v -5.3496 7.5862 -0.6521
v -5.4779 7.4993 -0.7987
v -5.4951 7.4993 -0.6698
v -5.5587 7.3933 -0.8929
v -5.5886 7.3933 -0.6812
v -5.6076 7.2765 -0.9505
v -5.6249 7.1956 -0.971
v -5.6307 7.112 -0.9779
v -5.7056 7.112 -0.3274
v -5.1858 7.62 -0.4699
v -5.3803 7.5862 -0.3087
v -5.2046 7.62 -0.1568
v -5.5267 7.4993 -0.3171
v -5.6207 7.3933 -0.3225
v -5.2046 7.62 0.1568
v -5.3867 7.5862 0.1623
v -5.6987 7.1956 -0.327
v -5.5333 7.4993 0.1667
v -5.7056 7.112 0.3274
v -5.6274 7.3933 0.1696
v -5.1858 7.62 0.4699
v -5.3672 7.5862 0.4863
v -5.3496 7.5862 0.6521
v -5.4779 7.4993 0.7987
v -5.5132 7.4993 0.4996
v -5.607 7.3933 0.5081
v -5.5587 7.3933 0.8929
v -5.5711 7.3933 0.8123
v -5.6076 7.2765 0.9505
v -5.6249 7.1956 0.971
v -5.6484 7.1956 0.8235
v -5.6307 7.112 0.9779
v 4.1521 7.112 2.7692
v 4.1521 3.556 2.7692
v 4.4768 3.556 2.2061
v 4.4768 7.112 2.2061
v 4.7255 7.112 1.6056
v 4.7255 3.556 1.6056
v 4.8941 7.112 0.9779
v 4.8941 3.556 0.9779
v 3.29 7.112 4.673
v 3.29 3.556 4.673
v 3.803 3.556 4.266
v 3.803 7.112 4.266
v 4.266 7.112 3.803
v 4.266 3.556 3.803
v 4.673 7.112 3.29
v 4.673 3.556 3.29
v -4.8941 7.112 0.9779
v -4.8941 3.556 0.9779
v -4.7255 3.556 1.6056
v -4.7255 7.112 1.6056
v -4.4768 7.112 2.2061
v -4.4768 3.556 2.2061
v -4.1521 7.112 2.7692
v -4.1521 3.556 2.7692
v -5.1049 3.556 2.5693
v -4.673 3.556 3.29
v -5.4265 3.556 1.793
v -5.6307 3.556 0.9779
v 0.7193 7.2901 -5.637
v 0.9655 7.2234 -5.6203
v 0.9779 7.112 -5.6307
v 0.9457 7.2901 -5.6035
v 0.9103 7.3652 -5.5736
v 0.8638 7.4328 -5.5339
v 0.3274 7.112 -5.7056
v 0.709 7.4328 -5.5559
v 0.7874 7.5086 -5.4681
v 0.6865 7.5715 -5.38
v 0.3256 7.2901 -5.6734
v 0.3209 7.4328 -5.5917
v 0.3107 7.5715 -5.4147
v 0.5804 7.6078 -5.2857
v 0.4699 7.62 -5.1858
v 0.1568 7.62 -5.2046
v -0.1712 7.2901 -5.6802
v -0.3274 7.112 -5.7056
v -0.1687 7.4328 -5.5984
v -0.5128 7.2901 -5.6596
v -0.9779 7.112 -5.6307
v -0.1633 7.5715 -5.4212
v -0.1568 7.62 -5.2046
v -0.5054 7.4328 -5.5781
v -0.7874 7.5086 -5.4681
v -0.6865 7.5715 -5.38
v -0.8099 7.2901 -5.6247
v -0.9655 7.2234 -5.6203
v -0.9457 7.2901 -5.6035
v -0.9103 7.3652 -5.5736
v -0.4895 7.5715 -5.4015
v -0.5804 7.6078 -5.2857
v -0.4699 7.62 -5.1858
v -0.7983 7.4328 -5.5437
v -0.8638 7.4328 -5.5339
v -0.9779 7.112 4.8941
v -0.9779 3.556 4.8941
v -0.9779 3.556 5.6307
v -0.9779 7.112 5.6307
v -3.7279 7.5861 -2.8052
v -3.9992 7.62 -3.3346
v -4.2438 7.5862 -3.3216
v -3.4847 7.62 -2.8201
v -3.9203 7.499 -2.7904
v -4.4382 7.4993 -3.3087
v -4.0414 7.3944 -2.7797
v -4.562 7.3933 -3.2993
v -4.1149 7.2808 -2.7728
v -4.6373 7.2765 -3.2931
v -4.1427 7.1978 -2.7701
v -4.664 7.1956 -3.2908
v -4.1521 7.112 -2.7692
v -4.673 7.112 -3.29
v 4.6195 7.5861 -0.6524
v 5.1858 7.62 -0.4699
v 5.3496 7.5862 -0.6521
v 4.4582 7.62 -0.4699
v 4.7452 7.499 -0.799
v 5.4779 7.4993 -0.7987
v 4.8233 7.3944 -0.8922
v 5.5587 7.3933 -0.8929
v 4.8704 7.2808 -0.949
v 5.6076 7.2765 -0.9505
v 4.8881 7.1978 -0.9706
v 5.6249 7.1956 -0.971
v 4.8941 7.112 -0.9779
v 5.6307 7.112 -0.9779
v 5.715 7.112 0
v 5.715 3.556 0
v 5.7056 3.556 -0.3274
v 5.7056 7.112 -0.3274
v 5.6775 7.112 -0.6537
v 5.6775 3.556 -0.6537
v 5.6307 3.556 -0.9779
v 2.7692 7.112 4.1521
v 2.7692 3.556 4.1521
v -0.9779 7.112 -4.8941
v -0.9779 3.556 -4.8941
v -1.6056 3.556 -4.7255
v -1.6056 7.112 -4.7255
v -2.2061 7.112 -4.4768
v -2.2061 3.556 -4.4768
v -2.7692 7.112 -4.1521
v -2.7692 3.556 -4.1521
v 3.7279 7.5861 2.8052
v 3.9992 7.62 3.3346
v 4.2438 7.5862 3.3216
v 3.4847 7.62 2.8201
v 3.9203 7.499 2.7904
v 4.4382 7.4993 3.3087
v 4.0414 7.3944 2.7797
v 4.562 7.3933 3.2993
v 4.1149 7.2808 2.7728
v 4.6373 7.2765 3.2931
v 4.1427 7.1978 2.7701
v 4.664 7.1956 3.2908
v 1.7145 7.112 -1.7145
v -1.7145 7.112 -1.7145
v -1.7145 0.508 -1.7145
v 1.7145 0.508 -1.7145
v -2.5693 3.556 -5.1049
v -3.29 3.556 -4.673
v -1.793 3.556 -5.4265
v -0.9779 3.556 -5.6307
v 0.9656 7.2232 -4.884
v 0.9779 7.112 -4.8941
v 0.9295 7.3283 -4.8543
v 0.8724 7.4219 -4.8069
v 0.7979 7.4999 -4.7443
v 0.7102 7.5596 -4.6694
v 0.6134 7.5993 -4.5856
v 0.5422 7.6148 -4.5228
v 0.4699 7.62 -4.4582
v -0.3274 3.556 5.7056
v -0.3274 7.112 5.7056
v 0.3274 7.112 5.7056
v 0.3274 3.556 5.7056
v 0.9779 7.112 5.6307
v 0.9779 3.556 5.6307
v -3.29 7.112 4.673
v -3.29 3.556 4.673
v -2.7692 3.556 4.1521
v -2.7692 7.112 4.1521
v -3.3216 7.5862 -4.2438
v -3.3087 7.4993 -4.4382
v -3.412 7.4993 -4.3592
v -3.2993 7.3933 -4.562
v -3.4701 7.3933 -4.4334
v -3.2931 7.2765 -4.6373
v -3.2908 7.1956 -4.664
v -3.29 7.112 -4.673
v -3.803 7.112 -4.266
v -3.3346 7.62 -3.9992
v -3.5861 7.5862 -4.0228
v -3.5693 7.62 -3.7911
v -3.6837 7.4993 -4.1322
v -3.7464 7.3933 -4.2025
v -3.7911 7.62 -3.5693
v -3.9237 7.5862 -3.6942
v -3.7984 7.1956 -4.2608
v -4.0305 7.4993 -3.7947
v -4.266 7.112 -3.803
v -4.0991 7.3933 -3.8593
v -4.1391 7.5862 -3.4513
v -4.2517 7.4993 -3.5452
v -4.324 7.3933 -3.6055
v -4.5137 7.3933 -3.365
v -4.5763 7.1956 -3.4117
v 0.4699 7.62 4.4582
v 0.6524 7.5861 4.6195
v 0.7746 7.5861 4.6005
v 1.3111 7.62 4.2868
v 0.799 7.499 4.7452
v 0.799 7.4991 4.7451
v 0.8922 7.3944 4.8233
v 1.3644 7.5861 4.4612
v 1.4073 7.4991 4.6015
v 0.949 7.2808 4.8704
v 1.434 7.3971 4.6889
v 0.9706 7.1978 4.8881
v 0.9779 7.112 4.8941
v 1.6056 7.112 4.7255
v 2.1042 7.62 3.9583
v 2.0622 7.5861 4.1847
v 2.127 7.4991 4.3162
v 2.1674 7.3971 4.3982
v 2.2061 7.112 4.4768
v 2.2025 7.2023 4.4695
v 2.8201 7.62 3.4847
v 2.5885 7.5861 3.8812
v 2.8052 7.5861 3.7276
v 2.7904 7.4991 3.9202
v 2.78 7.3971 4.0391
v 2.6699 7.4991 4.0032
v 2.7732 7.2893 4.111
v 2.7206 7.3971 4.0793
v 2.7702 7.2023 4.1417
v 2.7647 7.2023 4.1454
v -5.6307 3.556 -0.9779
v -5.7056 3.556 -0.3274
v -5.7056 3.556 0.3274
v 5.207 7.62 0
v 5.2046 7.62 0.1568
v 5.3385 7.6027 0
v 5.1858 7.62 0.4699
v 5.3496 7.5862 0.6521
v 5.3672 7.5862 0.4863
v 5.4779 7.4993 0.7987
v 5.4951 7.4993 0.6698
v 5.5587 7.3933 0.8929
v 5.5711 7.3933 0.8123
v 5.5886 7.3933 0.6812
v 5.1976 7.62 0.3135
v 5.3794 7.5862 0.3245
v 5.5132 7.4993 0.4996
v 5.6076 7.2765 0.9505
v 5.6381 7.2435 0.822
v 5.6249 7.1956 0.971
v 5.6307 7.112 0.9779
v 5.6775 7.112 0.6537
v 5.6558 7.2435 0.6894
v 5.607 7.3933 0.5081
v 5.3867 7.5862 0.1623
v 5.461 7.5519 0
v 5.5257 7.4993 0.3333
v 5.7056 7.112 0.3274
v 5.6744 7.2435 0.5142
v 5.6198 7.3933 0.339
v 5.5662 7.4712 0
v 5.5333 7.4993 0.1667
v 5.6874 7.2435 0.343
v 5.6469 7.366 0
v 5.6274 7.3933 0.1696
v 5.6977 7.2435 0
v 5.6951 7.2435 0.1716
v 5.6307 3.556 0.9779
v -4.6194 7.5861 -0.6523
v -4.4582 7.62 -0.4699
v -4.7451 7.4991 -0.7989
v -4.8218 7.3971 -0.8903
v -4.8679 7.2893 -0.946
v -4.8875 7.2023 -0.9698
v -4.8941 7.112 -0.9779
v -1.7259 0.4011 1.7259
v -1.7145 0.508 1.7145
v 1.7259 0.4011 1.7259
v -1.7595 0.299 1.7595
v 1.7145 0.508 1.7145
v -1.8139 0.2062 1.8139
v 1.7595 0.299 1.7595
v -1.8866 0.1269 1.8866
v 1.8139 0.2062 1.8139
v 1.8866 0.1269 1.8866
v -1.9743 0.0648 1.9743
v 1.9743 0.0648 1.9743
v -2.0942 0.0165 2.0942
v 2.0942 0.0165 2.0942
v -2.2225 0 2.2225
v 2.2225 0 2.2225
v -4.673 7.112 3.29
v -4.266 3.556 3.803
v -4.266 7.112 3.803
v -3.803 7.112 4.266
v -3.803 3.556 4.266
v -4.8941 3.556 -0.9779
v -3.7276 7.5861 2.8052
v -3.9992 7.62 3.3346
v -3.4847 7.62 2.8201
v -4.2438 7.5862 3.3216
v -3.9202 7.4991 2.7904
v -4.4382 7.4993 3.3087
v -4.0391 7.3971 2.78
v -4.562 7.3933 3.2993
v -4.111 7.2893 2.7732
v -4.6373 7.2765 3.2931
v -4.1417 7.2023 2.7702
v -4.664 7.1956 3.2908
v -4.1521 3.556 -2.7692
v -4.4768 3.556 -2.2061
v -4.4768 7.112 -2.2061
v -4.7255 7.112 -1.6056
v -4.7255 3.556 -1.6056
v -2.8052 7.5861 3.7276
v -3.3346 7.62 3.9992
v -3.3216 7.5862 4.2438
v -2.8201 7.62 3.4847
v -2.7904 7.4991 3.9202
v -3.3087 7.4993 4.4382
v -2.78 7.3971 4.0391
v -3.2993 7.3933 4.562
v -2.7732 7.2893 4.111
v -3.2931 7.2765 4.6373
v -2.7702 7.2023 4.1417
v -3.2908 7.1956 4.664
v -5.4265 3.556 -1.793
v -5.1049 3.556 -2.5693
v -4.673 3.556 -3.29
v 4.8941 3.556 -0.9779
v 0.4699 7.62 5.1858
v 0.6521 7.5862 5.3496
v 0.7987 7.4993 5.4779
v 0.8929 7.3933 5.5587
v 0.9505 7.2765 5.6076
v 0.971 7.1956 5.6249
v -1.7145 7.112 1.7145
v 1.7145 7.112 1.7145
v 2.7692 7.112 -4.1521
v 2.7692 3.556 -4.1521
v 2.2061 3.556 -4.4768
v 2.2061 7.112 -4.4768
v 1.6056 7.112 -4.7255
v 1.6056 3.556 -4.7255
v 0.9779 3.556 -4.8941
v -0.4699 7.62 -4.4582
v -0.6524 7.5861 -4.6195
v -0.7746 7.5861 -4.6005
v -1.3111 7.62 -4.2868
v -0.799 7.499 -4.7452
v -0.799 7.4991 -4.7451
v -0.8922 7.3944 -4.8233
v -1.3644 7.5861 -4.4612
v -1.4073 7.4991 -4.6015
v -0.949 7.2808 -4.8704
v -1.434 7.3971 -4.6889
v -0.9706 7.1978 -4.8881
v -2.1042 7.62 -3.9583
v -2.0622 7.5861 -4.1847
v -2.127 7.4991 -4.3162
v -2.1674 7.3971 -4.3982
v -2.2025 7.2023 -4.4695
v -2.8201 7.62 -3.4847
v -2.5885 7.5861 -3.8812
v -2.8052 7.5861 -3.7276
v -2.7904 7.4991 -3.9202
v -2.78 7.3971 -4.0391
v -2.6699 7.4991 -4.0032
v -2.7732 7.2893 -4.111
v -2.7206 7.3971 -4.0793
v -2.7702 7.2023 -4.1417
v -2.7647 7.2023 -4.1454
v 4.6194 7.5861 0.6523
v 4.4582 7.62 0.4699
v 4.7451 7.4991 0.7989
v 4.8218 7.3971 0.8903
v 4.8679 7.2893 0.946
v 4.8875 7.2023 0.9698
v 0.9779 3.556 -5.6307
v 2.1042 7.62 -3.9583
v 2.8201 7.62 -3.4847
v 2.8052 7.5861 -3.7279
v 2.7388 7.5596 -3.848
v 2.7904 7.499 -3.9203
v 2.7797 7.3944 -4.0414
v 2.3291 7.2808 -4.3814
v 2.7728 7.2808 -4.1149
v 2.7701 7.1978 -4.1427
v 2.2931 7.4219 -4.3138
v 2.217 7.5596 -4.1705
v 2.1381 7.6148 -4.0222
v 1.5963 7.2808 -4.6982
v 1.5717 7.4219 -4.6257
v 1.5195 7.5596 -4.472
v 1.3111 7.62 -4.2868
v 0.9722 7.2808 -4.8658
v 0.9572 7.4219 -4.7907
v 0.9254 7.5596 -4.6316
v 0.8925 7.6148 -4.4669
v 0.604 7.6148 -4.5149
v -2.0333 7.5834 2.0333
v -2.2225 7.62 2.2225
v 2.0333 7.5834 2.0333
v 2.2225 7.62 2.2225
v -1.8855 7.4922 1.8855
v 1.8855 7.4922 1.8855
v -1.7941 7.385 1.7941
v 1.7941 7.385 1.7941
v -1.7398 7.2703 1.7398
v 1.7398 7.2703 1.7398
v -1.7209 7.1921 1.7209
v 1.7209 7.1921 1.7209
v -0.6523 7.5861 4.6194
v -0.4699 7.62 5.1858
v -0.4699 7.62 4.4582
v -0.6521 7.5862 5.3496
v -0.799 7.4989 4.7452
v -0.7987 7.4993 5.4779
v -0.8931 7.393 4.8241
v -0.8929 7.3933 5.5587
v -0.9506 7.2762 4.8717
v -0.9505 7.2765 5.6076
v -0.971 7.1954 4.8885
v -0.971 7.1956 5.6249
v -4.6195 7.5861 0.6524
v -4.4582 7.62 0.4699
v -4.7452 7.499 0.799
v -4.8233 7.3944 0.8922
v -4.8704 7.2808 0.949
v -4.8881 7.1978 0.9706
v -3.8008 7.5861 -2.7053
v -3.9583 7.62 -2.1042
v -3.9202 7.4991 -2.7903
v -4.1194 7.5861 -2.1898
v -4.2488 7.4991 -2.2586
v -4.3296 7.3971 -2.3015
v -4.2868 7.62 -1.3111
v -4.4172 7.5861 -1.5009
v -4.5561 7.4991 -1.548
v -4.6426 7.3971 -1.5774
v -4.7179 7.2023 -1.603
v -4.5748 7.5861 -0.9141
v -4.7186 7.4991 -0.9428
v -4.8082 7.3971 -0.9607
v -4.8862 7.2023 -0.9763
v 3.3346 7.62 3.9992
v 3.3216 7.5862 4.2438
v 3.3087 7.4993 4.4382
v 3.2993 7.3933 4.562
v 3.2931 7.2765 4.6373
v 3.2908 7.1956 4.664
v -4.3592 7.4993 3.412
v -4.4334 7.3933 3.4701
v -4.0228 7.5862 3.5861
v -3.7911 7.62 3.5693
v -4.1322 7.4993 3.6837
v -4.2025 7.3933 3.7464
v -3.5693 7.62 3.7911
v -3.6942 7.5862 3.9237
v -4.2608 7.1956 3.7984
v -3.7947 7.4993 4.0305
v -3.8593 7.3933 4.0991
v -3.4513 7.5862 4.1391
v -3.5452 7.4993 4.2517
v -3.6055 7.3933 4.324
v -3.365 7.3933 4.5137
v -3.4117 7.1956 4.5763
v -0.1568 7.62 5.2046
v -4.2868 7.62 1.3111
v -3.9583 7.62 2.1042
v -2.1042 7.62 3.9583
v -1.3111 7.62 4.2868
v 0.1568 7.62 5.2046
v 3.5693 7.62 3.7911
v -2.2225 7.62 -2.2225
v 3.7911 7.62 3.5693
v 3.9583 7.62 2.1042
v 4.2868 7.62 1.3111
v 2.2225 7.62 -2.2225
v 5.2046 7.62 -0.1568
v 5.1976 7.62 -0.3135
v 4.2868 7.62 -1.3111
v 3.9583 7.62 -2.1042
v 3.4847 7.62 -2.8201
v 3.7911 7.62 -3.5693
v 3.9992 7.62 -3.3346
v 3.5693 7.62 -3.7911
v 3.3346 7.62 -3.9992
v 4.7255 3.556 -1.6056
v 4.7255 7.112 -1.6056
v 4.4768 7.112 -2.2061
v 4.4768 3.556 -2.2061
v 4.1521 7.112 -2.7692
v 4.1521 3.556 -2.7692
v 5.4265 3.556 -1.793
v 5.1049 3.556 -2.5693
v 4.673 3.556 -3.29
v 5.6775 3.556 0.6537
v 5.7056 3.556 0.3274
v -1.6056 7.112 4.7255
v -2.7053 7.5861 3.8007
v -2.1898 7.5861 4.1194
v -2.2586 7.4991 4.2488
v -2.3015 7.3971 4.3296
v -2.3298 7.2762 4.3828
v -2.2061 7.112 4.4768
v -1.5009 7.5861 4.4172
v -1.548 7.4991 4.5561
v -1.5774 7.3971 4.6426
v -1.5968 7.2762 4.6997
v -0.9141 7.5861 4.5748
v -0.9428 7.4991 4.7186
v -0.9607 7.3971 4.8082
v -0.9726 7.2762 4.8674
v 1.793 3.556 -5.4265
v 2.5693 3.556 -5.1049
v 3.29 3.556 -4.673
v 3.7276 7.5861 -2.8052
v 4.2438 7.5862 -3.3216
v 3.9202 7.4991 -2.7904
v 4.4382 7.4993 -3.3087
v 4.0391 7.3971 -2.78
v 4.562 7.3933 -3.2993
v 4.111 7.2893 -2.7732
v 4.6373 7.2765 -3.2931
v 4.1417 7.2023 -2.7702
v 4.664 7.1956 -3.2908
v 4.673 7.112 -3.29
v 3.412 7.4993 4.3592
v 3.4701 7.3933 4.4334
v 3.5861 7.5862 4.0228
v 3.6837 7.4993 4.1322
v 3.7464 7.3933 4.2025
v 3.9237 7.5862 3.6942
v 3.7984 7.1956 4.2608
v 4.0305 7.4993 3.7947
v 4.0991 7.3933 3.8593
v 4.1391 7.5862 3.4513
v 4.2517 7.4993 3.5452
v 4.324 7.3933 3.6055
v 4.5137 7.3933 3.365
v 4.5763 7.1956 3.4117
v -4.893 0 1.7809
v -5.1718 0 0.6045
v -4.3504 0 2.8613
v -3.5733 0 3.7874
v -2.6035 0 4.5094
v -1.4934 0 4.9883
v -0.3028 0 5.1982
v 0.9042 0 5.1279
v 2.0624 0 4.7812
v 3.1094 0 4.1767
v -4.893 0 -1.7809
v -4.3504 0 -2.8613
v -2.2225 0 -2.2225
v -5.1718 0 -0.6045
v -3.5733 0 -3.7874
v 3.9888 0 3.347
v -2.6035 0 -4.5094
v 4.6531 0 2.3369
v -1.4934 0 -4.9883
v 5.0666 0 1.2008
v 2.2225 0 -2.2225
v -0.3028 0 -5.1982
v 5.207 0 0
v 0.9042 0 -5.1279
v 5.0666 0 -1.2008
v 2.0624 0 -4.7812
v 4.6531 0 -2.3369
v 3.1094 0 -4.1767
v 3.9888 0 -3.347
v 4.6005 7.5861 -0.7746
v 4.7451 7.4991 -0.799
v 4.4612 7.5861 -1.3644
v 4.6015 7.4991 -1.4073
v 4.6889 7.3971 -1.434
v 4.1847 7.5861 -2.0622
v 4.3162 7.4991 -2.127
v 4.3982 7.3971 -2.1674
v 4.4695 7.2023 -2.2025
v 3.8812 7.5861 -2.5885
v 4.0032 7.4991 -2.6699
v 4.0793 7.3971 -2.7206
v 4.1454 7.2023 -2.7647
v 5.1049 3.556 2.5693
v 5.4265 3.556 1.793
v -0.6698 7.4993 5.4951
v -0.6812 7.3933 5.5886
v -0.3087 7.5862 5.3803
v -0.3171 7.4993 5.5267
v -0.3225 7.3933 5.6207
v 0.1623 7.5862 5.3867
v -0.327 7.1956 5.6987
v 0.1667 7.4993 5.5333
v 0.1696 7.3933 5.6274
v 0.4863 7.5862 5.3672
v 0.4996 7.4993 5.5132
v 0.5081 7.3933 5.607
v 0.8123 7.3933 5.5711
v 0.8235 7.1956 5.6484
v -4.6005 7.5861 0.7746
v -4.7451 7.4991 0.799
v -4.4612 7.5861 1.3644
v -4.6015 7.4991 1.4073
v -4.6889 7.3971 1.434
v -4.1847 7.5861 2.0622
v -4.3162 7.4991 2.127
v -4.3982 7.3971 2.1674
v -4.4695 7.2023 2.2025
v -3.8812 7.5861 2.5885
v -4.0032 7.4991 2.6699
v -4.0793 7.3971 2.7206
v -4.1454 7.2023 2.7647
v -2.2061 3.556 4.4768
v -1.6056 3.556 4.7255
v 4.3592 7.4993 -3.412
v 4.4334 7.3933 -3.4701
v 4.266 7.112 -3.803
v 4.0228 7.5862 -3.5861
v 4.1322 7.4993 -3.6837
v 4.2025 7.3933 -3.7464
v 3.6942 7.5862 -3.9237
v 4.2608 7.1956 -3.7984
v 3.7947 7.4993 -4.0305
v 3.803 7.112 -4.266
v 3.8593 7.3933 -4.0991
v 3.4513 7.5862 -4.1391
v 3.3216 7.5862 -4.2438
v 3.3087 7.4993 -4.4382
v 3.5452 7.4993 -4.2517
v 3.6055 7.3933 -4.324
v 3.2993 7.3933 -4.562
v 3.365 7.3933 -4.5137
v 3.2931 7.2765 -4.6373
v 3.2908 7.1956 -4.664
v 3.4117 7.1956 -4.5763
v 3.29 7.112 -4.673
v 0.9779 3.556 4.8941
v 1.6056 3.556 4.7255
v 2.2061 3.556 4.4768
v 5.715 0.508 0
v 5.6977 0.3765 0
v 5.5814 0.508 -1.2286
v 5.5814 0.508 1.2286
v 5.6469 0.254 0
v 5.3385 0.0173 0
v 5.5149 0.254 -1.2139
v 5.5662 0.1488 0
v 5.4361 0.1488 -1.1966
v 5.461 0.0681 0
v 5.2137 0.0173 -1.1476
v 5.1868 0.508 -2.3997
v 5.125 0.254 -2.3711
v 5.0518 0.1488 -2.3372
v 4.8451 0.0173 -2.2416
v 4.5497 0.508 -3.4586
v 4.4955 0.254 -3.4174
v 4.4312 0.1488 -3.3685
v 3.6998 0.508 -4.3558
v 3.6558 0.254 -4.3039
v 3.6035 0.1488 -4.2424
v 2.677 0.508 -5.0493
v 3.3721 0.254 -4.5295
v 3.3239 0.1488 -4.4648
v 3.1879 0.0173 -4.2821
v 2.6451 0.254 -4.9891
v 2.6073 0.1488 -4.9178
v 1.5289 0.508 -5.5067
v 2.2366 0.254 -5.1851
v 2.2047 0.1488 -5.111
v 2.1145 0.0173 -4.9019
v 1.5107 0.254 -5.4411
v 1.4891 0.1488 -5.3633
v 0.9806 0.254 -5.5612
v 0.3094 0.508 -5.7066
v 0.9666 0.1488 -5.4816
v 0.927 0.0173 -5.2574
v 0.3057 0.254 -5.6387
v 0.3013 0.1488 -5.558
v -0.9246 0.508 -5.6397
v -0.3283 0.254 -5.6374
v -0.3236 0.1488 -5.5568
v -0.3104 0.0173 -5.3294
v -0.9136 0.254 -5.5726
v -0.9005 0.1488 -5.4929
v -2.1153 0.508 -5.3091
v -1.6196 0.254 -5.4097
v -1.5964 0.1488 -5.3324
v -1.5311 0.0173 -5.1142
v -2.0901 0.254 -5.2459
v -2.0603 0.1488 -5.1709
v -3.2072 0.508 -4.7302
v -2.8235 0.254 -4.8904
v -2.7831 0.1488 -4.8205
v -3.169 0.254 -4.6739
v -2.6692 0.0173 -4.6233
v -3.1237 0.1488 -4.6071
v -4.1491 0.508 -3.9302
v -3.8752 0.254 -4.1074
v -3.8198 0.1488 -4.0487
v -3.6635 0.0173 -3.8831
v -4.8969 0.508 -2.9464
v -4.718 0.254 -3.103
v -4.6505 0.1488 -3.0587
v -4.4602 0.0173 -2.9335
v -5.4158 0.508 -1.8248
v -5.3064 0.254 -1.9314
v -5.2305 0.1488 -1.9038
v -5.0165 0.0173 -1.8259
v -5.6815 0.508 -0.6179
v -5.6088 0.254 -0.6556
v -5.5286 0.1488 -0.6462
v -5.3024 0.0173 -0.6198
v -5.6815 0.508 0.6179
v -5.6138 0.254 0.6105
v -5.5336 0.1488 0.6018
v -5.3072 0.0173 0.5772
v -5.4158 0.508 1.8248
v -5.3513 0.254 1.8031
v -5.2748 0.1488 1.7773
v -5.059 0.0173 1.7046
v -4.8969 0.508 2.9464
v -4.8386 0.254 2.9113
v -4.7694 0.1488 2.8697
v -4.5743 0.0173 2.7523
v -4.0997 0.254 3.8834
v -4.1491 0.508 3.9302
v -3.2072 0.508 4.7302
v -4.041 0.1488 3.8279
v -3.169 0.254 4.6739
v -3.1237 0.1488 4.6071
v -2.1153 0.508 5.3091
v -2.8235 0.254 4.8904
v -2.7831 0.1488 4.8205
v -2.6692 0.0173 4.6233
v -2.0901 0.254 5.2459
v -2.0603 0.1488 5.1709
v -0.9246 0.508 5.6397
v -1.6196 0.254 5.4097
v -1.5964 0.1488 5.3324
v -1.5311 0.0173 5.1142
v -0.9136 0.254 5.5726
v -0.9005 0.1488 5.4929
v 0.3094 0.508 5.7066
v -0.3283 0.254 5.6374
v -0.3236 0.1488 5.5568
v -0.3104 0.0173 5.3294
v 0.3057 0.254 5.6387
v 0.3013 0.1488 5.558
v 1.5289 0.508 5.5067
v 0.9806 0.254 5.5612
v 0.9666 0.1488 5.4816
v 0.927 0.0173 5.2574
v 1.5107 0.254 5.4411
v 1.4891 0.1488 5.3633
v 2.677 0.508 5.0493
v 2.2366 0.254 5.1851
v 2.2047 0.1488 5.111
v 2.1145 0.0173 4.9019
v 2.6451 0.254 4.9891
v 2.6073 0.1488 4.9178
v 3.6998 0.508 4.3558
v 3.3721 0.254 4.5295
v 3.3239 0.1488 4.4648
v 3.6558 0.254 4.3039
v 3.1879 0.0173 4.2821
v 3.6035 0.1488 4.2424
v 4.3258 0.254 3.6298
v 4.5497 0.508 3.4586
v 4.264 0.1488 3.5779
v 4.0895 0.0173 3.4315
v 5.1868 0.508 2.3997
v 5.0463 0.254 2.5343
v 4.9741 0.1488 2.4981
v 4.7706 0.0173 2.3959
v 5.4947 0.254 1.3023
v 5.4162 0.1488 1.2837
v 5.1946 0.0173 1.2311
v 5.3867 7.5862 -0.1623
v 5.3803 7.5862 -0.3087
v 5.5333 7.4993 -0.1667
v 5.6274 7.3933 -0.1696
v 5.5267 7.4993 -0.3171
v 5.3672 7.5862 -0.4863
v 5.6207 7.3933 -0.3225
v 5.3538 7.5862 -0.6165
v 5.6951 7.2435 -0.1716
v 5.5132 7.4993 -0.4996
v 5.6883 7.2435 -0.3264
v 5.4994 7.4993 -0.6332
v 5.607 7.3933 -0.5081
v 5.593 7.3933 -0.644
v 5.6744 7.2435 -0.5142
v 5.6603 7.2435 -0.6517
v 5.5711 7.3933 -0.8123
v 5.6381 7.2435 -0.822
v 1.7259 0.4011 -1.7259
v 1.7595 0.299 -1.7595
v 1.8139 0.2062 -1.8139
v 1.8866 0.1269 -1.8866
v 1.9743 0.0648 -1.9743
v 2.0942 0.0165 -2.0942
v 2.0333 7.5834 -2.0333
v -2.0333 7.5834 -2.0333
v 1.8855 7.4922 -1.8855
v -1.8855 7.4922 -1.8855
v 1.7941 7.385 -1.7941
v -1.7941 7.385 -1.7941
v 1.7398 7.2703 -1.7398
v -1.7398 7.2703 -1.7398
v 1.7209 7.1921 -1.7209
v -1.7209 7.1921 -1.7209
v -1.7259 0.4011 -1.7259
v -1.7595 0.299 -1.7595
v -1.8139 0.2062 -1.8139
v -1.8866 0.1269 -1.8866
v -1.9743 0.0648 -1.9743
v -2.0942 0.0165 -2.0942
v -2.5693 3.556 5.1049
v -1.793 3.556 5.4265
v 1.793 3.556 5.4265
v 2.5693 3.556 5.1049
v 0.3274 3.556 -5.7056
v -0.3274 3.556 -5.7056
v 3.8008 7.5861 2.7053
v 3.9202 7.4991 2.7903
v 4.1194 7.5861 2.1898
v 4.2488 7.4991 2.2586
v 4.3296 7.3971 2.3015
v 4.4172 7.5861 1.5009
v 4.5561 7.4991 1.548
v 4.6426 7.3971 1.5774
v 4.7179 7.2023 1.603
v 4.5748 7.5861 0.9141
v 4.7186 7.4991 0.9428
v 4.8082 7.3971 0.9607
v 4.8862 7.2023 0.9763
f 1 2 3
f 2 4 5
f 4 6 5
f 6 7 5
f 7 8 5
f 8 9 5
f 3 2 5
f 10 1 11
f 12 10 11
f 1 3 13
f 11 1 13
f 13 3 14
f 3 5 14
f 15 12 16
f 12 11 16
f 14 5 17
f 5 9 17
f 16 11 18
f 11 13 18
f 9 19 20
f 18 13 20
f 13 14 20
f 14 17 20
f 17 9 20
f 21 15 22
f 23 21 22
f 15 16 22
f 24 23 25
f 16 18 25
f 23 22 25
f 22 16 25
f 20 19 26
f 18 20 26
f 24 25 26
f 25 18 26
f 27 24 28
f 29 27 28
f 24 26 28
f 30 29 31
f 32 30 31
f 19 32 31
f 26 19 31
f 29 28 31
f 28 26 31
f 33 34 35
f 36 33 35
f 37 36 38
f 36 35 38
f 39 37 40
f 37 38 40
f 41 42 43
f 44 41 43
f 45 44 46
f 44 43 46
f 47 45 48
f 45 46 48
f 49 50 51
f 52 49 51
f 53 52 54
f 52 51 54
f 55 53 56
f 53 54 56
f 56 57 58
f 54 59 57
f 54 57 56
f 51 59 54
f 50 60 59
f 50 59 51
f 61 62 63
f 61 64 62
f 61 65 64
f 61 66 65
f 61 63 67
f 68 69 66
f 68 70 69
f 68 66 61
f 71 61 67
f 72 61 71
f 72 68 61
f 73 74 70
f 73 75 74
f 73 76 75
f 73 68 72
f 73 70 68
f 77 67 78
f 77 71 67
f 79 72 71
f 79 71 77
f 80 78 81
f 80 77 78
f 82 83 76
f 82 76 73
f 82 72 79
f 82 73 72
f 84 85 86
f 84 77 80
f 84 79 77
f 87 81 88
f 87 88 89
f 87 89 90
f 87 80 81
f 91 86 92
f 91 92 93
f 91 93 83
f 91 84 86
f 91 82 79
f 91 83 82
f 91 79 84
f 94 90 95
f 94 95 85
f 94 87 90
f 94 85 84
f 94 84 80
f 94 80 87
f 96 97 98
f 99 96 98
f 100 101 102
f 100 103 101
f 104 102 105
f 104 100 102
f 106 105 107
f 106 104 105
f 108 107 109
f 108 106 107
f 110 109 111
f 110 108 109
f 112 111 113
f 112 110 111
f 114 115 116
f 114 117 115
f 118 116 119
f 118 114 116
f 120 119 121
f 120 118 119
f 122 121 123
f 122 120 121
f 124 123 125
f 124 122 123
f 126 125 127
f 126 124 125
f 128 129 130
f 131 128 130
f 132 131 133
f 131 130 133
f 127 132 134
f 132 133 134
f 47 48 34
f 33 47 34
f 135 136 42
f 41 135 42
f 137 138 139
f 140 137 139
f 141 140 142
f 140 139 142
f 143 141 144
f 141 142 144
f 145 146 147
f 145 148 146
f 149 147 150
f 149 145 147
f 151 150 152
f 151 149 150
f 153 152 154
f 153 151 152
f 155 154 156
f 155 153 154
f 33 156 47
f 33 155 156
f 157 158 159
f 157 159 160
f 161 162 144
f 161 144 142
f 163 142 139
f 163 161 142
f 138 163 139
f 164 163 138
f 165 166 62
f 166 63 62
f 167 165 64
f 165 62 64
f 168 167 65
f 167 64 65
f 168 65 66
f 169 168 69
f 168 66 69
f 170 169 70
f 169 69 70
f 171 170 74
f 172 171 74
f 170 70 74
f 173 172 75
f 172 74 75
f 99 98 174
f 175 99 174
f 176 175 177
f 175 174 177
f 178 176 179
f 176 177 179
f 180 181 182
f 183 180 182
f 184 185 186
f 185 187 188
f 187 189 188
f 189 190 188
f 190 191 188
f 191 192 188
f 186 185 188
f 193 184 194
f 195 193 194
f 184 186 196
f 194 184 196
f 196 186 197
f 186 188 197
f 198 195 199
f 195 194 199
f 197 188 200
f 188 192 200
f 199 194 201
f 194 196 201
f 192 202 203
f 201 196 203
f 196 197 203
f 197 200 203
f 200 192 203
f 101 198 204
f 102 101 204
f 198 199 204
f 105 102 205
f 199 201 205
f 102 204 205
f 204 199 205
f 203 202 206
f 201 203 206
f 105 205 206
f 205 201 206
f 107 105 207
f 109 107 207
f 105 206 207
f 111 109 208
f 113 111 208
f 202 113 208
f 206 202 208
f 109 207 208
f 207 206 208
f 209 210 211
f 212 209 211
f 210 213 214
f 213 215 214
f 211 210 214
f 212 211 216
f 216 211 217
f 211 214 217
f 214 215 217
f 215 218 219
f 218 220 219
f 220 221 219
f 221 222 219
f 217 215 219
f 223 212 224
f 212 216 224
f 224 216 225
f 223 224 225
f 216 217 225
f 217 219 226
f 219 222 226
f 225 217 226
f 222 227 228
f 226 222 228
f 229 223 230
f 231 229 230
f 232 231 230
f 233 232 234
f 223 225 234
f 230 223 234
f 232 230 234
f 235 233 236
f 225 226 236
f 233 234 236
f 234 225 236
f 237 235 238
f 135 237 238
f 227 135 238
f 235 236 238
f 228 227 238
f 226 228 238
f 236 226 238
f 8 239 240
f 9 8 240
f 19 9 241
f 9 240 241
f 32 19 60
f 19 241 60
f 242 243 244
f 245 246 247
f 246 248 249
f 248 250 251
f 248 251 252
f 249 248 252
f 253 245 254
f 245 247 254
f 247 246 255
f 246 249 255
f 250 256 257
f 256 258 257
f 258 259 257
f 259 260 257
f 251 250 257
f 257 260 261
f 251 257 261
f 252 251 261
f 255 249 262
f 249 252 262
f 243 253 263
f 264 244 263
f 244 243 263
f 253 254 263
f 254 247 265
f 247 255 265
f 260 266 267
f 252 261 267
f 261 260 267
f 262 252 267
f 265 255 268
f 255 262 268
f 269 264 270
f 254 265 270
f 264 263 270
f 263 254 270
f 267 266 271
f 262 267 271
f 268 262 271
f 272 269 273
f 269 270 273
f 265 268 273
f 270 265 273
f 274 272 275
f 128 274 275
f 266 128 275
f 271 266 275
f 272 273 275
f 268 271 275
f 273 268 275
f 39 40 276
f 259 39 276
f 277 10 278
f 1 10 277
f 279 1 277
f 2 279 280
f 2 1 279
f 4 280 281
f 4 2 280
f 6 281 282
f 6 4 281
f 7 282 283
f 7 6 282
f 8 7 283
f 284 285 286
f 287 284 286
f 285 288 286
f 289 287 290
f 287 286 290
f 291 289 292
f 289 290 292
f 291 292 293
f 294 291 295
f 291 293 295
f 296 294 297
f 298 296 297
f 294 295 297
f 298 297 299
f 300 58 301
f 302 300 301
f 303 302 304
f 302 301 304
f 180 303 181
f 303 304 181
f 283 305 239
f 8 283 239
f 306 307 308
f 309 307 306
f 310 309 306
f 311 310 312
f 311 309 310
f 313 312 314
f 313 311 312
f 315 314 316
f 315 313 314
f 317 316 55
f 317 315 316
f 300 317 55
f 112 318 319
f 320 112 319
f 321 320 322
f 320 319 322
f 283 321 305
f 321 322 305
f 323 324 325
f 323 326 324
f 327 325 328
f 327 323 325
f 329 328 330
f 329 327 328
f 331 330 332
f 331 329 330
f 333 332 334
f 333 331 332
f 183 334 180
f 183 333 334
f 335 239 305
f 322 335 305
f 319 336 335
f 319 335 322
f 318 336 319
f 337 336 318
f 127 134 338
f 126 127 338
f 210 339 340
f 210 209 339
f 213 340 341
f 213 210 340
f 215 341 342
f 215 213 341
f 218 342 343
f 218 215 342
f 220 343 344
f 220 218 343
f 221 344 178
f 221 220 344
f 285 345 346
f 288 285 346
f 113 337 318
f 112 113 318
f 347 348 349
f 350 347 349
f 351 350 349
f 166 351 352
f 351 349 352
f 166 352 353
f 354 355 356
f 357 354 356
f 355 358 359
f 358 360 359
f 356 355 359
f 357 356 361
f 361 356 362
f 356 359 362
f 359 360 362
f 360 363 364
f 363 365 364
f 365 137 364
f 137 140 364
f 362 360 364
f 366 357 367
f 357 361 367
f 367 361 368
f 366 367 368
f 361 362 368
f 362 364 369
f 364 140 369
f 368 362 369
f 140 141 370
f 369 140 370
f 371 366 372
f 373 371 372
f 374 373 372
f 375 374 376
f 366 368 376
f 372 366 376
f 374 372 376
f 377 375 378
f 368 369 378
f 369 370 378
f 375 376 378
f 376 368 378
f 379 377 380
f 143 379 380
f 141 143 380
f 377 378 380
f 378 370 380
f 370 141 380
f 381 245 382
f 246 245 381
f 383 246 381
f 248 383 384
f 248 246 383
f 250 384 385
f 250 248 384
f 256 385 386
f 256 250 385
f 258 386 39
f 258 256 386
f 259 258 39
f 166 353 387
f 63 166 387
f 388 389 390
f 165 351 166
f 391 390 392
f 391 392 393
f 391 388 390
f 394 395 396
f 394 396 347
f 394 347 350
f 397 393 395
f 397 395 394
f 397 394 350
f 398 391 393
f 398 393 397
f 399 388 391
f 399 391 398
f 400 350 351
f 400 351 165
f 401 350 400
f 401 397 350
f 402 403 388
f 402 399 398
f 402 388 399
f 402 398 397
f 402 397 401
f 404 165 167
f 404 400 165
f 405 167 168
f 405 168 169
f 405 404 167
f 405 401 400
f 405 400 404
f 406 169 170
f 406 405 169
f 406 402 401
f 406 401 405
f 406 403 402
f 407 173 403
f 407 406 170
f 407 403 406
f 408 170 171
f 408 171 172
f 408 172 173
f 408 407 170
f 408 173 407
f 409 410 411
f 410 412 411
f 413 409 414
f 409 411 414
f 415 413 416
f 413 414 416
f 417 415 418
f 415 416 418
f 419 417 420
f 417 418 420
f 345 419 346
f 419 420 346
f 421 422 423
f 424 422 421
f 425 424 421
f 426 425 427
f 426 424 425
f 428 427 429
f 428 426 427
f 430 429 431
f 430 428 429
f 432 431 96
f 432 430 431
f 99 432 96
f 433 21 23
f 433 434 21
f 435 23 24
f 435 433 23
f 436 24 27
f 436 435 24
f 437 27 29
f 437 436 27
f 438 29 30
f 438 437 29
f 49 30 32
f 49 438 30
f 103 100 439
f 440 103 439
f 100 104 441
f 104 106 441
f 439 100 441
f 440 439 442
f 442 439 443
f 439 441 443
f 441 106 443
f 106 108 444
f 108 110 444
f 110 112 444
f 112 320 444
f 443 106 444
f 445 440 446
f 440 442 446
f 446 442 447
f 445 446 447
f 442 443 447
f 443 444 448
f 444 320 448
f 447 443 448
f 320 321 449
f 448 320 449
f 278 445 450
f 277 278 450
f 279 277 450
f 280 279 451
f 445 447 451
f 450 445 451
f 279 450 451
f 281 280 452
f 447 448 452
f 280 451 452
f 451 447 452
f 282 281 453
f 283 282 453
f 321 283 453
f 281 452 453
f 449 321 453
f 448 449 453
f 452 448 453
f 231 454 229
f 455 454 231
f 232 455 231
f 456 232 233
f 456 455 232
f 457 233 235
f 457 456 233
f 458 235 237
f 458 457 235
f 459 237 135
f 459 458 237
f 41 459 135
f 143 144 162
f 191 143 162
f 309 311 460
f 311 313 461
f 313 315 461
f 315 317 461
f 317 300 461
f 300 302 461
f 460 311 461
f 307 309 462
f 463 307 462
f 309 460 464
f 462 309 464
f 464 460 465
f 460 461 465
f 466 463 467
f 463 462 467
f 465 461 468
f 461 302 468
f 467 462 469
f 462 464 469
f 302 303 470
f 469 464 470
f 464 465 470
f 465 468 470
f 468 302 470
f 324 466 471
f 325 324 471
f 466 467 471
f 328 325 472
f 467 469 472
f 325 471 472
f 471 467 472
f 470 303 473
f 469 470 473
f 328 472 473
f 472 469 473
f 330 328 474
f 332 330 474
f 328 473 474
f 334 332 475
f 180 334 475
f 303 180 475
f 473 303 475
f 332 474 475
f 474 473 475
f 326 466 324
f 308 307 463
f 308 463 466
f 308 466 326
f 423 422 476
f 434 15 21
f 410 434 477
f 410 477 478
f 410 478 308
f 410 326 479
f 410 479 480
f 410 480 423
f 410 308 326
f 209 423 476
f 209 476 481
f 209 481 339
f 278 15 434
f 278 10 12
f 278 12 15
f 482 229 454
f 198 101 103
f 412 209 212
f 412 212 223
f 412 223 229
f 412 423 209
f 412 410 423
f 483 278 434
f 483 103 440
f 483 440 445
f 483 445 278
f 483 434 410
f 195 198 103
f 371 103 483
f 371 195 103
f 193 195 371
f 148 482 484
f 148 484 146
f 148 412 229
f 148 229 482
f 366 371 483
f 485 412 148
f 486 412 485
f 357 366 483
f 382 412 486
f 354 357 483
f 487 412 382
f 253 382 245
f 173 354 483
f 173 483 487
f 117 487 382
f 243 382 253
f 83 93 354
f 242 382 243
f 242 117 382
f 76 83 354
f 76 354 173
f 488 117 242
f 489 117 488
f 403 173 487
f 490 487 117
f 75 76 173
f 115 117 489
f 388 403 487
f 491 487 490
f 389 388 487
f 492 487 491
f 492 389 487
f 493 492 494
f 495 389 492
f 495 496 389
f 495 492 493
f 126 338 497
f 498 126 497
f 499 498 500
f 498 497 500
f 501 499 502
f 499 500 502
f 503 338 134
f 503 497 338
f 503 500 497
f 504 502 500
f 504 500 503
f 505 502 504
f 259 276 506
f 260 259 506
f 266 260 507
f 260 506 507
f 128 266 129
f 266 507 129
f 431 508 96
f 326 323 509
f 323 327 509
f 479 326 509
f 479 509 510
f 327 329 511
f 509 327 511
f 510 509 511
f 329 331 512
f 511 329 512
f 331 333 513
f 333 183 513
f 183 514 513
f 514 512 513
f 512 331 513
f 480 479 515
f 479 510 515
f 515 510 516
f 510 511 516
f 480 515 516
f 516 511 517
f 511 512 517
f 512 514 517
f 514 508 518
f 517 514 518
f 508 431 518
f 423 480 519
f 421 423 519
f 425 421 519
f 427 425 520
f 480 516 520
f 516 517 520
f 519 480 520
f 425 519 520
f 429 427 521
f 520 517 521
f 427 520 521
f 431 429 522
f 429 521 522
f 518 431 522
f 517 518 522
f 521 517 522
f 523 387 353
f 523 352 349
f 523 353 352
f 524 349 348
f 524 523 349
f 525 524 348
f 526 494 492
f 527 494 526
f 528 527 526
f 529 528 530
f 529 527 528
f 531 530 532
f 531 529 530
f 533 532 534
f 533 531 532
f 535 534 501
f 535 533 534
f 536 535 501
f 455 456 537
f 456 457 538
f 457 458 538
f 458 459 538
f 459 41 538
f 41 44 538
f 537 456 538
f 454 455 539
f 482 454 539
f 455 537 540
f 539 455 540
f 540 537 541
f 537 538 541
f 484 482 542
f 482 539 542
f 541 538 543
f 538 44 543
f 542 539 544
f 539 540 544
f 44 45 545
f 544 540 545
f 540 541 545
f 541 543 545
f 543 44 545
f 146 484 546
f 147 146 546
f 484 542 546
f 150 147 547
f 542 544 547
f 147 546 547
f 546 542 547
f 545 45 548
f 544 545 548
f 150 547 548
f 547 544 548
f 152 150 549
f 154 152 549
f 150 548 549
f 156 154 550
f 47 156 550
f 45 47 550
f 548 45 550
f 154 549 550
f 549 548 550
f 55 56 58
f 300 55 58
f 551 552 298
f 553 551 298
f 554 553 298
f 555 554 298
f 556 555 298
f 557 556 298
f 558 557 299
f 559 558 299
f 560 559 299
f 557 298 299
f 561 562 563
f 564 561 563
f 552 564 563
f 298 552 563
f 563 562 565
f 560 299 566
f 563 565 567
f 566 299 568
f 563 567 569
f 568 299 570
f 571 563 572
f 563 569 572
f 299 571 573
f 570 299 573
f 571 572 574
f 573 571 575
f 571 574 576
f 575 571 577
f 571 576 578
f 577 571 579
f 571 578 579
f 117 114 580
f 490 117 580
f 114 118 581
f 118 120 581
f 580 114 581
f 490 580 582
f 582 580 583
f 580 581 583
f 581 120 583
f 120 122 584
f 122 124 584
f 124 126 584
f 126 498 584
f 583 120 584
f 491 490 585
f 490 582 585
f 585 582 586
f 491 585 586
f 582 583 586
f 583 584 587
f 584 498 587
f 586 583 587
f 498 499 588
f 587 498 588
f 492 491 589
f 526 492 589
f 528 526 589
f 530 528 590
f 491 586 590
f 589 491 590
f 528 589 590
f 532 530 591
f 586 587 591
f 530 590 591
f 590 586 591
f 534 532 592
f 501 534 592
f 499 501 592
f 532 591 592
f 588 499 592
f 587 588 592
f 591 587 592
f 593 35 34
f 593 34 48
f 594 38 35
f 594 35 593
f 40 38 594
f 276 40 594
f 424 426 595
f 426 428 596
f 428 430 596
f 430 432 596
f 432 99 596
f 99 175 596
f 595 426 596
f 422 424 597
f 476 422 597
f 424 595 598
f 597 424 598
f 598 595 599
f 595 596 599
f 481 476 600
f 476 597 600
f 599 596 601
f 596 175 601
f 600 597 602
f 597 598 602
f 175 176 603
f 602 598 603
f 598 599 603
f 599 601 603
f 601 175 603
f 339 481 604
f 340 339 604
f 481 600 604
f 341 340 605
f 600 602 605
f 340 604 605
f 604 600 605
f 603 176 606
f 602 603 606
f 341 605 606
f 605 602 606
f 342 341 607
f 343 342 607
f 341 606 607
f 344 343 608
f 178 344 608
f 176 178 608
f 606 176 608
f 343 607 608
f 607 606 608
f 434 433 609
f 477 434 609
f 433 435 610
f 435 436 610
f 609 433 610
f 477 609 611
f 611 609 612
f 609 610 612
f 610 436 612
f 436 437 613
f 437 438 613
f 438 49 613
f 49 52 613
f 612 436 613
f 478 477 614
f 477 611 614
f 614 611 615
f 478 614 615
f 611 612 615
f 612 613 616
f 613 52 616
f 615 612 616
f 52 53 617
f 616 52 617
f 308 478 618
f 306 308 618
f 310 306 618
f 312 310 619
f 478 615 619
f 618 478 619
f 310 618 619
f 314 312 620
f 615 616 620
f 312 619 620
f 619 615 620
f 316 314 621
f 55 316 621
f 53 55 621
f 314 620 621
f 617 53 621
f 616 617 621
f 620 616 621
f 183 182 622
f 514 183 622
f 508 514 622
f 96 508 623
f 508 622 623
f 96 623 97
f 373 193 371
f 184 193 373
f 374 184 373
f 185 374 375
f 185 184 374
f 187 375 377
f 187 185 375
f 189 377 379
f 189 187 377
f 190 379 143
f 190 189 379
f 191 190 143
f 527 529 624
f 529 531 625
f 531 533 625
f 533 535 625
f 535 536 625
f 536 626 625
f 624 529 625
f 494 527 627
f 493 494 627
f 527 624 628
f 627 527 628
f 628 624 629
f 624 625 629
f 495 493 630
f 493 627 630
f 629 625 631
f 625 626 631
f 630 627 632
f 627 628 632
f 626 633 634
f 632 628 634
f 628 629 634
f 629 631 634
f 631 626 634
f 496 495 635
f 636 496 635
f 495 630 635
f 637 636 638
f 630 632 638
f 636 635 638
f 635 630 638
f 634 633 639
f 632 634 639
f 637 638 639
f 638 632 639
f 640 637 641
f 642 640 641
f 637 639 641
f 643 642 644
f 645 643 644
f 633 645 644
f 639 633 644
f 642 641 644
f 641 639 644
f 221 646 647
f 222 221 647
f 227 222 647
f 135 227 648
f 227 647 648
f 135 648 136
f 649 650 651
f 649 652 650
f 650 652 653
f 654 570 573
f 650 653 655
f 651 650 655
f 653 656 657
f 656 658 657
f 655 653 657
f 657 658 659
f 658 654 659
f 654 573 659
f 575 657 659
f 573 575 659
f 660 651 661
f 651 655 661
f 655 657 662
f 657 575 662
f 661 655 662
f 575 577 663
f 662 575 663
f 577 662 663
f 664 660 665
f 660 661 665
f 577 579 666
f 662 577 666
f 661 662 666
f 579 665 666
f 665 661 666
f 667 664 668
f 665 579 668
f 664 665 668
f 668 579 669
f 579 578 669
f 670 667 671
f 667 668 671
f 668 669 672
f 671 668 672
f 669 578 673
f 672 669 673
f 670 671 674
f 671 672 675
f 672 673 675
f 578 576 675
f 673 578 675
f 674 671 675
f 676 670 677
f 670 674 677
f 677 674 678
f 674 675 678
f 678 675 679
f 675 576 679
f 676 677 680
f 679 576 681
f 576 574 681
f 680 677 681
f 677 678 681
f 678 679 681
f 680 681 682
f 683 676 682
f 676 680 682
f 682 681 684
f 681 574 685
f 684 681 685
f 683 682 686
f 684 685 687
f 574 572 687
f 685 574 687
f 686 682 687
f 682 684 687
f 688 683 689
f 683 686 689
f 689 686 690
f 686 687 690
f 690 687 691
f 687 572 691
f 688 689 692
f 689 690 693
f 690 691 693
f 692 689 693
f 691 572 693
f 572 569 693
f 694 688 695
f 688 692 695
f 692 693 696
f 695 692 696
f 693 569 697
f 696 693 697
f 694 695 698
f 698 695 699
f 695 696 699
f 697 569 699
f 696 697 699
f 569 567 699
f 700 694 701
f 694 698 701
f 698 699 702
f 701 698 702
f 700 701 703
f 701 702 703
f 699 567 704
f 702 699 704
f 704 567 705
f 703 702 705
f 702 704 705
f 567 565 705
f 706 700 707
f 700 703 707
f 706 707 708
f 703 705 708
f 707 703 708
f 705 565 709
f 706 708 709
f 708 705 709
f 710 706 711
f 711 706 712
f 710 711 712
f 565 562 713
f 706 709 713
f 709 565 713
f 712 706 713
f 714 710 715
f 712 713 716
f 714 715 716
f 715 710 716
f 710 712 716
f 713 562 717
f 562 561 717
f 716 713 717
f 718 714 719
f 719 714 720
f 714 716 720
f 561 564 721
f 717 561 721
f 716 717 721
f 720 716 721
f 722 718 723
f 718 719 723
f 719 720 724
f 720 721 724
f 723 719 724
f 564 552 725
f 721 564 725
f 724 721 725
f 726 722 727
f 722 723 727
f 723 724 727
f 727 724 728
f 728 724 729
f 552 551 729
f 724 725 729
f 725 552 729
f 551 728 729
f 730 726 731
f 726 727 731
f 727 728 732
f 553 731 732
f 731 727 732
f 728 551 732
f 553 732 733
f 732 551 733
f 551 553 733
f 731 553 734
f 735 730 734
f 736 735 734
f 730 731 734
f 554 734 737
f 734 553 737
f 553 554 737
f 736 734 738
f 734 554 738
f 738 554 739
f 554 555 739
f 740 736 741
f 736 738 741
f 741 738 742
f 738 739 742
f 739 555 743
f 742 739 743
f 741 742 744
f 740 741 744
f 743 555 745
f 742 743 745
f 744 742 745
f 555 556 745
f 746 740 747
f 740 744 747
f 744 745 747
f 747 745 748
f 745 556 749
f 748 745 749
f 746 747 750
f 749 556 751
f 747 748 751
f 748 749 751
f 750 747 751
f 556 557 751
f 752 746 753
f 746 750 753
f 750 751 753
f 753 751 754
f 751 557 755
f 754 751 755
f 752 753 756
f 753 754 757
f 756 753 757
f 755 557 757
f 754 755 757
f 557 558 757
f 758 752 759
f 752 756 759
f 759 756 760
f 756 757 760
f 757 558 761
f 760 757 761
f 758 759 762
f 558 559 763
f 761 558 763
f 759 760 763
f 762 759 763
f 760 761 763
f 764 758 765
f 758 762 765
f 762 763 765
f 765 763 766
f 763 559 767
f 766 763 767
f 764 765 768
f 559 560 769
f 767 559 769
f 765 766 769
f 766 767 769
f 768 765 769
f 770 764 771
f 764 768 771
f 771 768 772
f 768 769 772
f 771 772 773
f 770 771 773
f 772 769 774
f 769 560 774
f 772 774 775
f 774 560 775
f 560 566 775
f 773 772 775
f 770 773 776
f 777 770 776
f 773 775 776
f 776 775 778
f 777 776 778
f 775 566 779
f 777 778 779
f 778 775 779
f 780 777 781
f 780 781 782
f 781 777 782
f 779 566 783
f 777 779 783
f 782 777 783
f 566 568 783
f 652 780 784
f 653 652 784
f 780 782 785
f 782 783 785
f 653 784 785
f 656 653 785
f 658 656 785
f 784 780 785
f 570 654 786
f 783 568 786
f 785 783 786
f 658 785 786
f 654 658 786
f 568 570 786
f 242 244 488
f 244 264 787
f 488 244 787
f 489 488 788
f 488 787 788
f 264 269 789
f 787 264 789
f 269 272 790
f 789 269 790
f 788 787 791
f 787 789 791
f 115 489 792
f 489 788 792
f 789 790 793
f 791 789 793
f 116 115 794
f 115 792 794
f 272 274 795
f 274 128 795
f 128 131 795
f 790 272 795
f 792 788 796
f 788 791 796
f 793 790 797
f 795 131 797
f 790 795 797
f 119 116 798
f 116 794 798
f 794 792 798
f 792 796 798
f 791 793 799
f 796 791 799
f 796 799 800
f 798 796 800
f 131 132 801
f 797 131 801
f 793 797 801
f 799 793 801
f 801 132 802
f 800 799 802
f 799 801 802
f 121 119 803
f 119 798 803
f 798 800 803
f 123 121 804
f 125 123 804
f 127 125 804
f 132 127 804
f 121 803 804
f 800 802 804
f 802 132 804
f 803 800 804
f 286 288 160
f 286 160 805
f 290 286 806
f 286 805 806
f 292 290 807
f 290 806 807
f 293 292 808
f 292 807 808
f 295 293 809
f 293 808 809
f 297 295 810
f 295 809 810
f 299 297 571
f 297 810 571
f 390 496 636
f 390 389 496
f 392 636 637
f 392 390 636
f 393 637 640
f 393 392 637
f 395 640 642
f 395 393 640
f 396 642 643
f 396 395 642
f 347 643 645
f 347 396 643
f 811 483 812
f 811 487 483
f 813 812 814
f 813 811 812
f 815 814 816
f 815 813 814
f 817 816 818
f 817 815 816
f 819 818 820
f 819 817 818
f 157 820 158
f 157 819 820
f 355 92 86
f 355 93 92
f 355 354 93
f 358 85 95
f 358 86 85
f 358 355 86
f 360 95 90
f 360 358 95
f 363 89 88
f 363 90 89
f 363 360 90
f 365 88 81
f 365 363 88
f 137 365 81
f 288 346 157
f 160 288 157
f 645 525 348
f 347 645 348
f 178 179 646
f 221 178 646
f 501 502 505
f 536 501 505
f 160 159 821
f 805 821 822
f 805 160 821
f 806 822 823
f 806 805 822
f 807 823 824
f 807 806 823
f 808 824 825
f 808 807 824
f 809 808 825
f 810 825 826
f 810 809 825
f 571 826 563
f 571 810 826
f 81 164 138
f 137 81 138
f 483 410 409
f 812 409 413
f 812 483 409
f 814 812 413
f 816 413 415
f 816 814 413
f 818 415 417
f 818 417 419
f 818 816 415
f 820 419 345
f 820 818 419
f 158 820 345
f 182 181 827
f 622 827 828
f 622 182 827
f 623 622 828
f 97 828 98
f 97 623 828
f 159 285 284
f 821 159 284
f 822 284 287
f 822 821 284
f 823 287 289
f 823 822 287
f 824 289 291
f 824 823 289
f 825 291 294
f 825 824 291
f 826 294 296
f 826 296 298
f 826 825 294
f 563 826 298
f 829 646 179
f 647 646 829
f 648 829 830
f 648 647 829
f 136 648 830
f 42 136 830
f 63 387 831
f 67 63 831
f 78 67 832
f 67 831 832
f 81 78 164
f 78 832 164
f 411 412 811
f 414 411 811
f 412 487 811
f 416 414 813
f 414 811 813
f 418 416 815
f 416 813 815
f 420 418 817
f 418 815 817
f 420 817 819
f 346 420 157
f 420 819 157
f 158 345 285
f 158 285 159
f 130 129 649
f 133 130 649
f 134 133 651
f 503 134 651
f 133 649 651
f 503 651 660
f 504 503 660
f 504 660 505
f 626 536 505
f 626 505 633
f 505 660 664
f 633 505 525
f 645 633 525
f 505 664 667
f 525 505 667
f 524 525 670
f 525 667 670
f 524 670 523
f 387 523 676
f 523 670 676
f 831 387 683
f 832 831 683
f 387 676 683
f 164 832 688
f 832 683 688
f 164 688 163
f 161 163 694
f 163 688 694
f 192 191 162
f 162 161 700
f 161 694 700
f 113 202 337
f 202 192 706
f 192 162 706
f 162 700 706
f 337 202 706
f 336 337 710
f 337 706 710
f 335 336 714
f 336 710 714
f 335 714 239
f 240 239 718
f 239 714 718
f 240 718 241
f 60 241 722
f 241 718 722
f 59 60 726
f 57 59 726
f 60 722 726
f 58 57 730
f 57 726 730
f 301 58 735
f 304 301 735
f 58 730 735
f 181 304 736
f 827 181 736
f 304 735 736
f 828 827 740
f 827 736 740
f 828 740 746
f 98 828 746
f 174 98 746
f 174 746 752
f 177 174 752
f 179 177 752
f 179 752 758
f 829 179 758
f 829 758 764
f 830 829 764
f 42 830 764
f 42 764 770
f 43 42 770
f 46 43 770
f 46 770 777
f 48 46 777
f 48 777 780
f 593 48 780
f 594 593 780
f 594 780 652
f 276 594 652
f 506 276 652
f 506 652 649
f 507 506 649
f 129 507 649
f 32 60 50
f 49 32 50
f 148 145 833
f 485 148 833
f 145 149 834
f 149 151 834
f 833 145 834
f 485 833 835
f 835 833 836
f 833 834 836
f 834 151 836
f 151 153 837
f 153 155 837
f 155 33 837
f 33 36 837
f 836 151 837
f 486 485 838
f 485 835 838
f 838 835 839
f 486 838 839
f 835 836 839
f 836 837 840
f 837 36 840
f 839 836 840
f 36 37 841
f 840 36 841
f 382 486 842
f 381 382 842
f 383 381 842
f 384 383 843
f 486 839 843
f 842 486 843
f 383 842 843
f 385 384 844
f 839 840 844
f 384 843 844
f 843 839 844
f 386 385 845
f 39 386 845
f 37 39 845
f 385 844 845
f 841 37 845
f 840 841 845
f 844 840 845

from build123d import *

# Parameters (mm, degrees)
SKETCH1_R               = 5.715
BOSS_EXTRUDE2_DEPTH     = 3.556
SKETCH2_R               = 4.990855354
BOSS_EXTRUDE3_DEPTH     = 4.064
SKETCH3_W               = 3.429
SKETCH3_H               = 3.429
CUT_EXTRUDE1_DEPTH      = 1
CUT_EXTRUDE1_DEPTH_BACK = 8.62
FILLET1_R               = 0.508


with BuildPart() as part:
    # Sketch1 → Boss-Extrude2 (new body)
    with BuildSketch(Plane(origin=(0, 0, 0), x_dir=(1, 0, 0), z_dir=(0, 1, 0))):
        Circle(SKETCH1_R)
    extrude(amount=BOSS_EXTRUDE2_DEPTH)

    # Sketch2 → Boss-Extrude3 (add)
    with BuildSketch(Plane(origin=(0, 3.556, 0), x_dir=(1, 0, 0), z_dir=(0, 1, 0))):
        Circle(SKETCH2_R)
        with BuildLine():
            ThreePointArc((0.9779, 5.630713684), (0, 5.715), (-0.9779, 5.630713684))
            Line((-0.9779, 5.630713684), (-0.9779, 4.894113684))
            ThreePointArc((-0.9779, 4.894113684), (0, 4.990855354), (0.9779, 4.894113684))
            Line((0.9779, 4.894113684), (0.9779, 5.630713684))
        make_face()
        with BuildLine():
            Line((-2.769181252, 4.152140695), (-3.290036107, 4.67299555))
            ThreePointArc((-3.290036107, 4.67299555), (-4.041115254, 4.041115254), (-4.67299555, 3.290036107))
            Line((-4.67299555, 3.290036107), (-4.152140695, 2.769181252))
            ThreePointArc((-4.152140695, 2.769181252), (-3.529067664, 3.529067664), (-2.769181252, 4.152140695))
        make_face()
        with BuildLine():
            Line((-4.894113684, 0.9779), (-5.630713684, 0.9779))
            ThreePointArc((-5.630713684, 0.9779), (-5.715, 0), (-5.630713684, -0.9779))
            Line((-5.630713684, -0.9779), (-4.894113684, -0.9779))
            ThreePointArc((-4.894113684, -0.9779), (-4.990855354, 0), (-4.894113684, 0.9779))
        make_face()
        with BuildLine():
            Line((-4.152140695, -2.769181252), (-4.67299555, -3.290036107))
            ThreePointArc((-4.67299555, -3.290036107), (-4.041115254, -4.041115254), (-3.290036107, -4.67299555))
            Line((-3.290036107, -4.67299555), (-2.769181252, -4.152140695))
            ThreePointArc((-2.769181252, -4.152140695), (-3.529067664, -3.529067664), (-4.152140695, -2.769181252))
        make_face()
        with BuildLine():
            Line((-0.9779, -4.894113684), (-0.9779, -5.630713684))
            ThreePointArc((-0.9779, -5.630713684), (0, -5.715), (0.9779, -5.630713684))
            Line((0.9779, -5.630713684), (0.9779, -4.894113684))
            ThreePointArc((0.9779, -4.894113684), (0, -4.990855354), (-0.9779, -4.894113684))
        make_face()
        with BuildLine():
            ThreePointArc((3.290036107, -4.67299555), (4.041115254, -4.041115254), (4.67299555, -3.290036107))
            Line((4.67299555, -3.290036107), (4.152140695, -2.769181252))
            ThreePointArc((4.152140695, -2.769181252), (3.529067664, -3.529067664), (2.769181252, -4.152140695))
            Line((2.769181252, -4.152140695), (3.290036107, -4.67299555))
        make_face()
        with BuildLine():
            ThreePointArc((5.715, 0), (5.693889431, 0.490762823), (5.630713684, 0.9779))
            Line((5.630713684, 0.9779), (4.894113684, 0.9779))
            ThreePointArc((4.894113684, 0.9779), (4.96661105, 0.491336789), (4.990855354, 0))
            ThreePointArc((4.990855354, 0), (4.96661105, -0.491336789), (4.894113684, -0.9779))
            Line((4.894113684, -0.9779), (5.630713684, -0.9779))
            ThreePointArc((5.630713684, -0.9779), (5.693889431, -0.490762823), (5.715, 0))
        make_face()
        with BuildLine():
            ThreePointArc((4.67299555, 3.290036107), (4.041115254, 4.041115254), (3.290036107, 4.67299555))
            Line((3.290036107, 4.67299555), (2.769181252, 4.152140695))
            ThreePointArc((2.769181252, 4.152140695), (3.529067664, 3.529067664), (4.152140695, 2.769181252))
            Line((4.152140695, 2.769181252), (4.67299555, 3.290036107))
        make_face()
    extrude(amount=BOSS_EXTRUDE3_DEPTH)

    # Sketch3 → Cut-Extrude1 (cut, two sides)
    with BuildSketch(Plane(origin=(0, 7.62, 0), x_dir=(1, 0, 0), z_dir=(0, 1, 0))) as cut_extrude1_sk:
        Rectangle(SKETCH3_W, SKETCH3_H)
    extrude(amount=CUT_EXTRUDE1_DEPTH, mode=Mode.SUBTRACT)
    extrude(cut_extrude1_sk.sketch, amount=-CUT_EXTRUDE1_DEPTH_BACK, mode=Mode.SUBTRACT)

    # Fillet1
    fillet1_edges = [part.edges().sort_by_distance(p)[0] for p in [
        (0, 7.62, -1.7145),
        (-1.7145, 7.62, 0),
        (0, 7.62, 1.7145),
        (1.7145, 7.62, 0),
        (1.7145, 0, 0),
        (0, 0, 1.7145),
        (-1.7145, 0, 0),
        (0, 0, -1.7145),
        (-5.715, 0, 0),
        (-0.9779, 7.62, 5.262413684),
        (0.9779, 7.62, 5.262413684),
        (1.909917657, 7.62, 4.610949111),
        (4.041115254, 7.62, 4.041115254),
        (4.412568123, 7.62, 3.02960868),
        (4.610949111, 7.62, 1.909917657),
        (5.715, 7.62, 0),
        (5.262413684, 7.62, -0.9779),
        (4.610949111, 7.62, -1.909917657),
        (4.041115254, 7.62, -4.041115254),
        (3.02960868, 7.62, -4.412568123),
        (1.909917657, 7.62, -4.610949111),
        (0, 7.62, -5.715),
        (-0.9779, 7.62, -5.262413684),
        (-1.909917657, 7.62, -4.610949111),
        (-4.041115254, 7.62, -4.041115254),
        (-4.412568123, 7.62, -3.02960868),
        (-4.610949111, 7.62, -1.909917657),
        (-5.715, 7.62, 0),
        (-5.262413684, 7.62, 0.9779),
        (-4.610949111, 7.62, 1.909917657),
        (-4.041115254, 7.62, 4.041115254),
        (-3.02960868, 7.62, 4.412568123),
        (-1.909917657, 7.62, 4.610949111),
        (0, 7.62, 5.715),
        (3.02960868, 7.62, 4.412568123),
        (5.262413684, 7.62, 0.9779),
        (4.412568123, 7.62, -3.02960868),
        (0.9779, 7.62, -5.262413684),
        (-3.02960868, 7.62, -4.412568123),
        (-5.262413684, 7.62, -0.9779),
        (-4.412568123, 7.62, 3.02960868),
    ]]
    fillet(fillet1_edges, radius=FILLET1_R)


solid = part.part
